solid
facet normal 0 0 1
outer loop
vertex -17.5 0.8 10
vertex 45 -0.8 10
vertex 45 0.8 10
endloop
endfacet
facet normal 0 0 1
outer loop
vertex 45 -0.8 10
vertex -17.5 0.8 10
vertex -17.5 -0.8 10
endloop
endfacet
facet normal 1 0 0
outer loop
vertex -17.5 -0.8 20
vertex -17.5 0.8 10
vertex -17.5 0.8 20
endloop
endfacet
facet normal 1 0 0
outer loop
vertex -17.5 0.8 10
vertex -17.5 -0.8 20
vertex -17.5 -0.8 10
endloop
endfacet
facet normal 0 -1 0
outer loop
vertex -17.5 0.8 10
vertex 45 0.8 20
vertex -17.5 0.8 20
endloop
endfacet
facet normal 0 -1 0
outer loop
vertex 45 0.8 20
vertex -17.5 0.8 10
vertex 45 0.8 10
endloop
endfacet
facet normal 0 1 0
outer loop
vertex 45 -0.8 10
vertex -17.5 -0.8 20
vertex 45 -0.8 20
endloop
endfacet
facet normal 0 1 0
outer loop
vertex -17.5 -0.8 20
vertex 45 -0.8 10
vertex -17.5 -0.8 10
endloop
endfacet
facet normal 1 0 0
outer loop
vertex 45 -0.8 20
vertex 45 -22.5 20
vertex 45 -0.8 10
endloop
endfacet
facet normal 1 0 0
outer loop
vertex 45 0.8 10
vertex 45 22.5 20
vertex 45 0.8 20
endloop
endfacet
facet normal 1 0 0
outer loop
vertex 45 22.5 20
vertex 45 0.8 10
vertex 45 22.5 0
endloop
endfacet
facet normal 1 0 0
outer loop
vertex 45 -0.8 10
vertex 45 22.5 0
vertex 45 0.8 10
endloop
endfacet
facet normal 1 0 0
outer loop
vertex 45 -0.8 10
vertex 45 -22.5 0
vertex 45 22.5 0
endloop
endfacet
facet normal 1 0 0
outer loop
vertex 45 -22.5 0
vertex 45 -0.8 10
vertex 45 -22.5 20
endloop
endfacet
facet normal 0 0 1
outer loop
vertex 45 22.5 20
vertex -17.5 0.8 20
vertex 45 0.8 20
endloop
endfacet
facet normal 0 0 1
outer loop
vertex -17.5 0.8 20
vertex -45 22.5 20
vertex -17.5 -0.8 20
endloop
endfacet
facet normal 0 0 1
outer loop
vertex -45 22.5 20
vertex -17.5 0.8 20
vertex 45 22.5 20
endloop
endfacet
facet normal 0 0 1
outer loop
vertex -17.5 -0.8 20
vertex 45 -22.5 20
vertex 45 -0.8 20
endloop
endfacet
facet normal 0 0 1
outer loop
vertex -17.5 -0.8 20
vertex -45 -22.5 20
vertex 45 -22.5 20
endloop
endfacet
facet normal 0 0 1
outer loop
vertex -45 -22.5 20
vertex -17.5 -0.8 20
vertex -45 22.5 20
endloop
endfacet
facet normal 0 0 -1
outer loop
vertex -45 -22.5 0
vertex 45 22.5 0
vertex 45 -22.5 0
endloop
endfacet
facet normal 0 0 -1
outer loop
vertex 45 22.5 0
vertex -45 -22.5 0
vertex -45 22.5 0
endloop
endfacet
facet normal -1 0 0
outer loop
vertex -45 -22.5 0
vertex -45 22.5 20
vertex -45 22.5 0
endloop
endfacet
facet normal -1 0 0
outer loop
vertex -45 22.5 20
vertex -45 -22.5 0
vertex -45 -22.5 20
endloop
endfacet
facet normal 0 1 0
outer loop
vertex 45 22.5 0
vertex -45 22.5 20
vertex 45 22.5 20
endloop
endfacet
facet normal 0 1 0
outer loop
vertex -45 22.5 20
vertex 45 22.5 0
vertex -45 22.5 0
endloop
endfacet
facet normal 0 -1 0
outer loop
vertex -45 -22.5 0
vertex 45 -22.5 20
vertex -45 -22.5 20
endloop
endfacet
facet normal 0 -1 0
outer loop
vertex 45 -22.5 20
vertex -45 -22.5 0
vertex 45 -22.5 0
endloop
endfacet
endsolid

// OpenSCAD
// Slide drying rack
// Print orientation: base on XY plane, slots open upward (+Z)

// ---------- Block ----------
block_l = 90;    // block length along X (mm)
block_w = 45;    // block width along Y (mm)
block_h = 20;    // block height along Z (mm)

// ---------- Slots ----------
slot_n     = 10;   // number of slide slots
slot_len   = 77;   // slot length along X (mm)
slot_w     = 1.6;  // slot width along Y (mm)
slot_depth = 10;   // slot depth into block (mm)
slot_pitch = 3.5;  // centre-to-centre spacing along Y (mm)

// ---------- Misc ----------
eps = 0.5;       // overcut past faces to avoid coplanar faces
$fn = 64;

// X position of first slot centre (group centred on block)
slot_x0 = -(slot_n * slot_pitch - slot_len) / 2;

difference() {
    // Base block
    translate([-block_l / 2, -block_w / 2, 0])
        cube([block_l, block_w, block_h]);

    // Parallel slots open at the top
    for (i = [0 : slot_n - 1]) {
        translate([slot_x0 + i * slot_pitch - slot_len / 2,
                   -slot_w / 2,
                   block_h - slot_depth])
            cube([slot_len, slot_w, slot_depth + eps]);
    }
}
